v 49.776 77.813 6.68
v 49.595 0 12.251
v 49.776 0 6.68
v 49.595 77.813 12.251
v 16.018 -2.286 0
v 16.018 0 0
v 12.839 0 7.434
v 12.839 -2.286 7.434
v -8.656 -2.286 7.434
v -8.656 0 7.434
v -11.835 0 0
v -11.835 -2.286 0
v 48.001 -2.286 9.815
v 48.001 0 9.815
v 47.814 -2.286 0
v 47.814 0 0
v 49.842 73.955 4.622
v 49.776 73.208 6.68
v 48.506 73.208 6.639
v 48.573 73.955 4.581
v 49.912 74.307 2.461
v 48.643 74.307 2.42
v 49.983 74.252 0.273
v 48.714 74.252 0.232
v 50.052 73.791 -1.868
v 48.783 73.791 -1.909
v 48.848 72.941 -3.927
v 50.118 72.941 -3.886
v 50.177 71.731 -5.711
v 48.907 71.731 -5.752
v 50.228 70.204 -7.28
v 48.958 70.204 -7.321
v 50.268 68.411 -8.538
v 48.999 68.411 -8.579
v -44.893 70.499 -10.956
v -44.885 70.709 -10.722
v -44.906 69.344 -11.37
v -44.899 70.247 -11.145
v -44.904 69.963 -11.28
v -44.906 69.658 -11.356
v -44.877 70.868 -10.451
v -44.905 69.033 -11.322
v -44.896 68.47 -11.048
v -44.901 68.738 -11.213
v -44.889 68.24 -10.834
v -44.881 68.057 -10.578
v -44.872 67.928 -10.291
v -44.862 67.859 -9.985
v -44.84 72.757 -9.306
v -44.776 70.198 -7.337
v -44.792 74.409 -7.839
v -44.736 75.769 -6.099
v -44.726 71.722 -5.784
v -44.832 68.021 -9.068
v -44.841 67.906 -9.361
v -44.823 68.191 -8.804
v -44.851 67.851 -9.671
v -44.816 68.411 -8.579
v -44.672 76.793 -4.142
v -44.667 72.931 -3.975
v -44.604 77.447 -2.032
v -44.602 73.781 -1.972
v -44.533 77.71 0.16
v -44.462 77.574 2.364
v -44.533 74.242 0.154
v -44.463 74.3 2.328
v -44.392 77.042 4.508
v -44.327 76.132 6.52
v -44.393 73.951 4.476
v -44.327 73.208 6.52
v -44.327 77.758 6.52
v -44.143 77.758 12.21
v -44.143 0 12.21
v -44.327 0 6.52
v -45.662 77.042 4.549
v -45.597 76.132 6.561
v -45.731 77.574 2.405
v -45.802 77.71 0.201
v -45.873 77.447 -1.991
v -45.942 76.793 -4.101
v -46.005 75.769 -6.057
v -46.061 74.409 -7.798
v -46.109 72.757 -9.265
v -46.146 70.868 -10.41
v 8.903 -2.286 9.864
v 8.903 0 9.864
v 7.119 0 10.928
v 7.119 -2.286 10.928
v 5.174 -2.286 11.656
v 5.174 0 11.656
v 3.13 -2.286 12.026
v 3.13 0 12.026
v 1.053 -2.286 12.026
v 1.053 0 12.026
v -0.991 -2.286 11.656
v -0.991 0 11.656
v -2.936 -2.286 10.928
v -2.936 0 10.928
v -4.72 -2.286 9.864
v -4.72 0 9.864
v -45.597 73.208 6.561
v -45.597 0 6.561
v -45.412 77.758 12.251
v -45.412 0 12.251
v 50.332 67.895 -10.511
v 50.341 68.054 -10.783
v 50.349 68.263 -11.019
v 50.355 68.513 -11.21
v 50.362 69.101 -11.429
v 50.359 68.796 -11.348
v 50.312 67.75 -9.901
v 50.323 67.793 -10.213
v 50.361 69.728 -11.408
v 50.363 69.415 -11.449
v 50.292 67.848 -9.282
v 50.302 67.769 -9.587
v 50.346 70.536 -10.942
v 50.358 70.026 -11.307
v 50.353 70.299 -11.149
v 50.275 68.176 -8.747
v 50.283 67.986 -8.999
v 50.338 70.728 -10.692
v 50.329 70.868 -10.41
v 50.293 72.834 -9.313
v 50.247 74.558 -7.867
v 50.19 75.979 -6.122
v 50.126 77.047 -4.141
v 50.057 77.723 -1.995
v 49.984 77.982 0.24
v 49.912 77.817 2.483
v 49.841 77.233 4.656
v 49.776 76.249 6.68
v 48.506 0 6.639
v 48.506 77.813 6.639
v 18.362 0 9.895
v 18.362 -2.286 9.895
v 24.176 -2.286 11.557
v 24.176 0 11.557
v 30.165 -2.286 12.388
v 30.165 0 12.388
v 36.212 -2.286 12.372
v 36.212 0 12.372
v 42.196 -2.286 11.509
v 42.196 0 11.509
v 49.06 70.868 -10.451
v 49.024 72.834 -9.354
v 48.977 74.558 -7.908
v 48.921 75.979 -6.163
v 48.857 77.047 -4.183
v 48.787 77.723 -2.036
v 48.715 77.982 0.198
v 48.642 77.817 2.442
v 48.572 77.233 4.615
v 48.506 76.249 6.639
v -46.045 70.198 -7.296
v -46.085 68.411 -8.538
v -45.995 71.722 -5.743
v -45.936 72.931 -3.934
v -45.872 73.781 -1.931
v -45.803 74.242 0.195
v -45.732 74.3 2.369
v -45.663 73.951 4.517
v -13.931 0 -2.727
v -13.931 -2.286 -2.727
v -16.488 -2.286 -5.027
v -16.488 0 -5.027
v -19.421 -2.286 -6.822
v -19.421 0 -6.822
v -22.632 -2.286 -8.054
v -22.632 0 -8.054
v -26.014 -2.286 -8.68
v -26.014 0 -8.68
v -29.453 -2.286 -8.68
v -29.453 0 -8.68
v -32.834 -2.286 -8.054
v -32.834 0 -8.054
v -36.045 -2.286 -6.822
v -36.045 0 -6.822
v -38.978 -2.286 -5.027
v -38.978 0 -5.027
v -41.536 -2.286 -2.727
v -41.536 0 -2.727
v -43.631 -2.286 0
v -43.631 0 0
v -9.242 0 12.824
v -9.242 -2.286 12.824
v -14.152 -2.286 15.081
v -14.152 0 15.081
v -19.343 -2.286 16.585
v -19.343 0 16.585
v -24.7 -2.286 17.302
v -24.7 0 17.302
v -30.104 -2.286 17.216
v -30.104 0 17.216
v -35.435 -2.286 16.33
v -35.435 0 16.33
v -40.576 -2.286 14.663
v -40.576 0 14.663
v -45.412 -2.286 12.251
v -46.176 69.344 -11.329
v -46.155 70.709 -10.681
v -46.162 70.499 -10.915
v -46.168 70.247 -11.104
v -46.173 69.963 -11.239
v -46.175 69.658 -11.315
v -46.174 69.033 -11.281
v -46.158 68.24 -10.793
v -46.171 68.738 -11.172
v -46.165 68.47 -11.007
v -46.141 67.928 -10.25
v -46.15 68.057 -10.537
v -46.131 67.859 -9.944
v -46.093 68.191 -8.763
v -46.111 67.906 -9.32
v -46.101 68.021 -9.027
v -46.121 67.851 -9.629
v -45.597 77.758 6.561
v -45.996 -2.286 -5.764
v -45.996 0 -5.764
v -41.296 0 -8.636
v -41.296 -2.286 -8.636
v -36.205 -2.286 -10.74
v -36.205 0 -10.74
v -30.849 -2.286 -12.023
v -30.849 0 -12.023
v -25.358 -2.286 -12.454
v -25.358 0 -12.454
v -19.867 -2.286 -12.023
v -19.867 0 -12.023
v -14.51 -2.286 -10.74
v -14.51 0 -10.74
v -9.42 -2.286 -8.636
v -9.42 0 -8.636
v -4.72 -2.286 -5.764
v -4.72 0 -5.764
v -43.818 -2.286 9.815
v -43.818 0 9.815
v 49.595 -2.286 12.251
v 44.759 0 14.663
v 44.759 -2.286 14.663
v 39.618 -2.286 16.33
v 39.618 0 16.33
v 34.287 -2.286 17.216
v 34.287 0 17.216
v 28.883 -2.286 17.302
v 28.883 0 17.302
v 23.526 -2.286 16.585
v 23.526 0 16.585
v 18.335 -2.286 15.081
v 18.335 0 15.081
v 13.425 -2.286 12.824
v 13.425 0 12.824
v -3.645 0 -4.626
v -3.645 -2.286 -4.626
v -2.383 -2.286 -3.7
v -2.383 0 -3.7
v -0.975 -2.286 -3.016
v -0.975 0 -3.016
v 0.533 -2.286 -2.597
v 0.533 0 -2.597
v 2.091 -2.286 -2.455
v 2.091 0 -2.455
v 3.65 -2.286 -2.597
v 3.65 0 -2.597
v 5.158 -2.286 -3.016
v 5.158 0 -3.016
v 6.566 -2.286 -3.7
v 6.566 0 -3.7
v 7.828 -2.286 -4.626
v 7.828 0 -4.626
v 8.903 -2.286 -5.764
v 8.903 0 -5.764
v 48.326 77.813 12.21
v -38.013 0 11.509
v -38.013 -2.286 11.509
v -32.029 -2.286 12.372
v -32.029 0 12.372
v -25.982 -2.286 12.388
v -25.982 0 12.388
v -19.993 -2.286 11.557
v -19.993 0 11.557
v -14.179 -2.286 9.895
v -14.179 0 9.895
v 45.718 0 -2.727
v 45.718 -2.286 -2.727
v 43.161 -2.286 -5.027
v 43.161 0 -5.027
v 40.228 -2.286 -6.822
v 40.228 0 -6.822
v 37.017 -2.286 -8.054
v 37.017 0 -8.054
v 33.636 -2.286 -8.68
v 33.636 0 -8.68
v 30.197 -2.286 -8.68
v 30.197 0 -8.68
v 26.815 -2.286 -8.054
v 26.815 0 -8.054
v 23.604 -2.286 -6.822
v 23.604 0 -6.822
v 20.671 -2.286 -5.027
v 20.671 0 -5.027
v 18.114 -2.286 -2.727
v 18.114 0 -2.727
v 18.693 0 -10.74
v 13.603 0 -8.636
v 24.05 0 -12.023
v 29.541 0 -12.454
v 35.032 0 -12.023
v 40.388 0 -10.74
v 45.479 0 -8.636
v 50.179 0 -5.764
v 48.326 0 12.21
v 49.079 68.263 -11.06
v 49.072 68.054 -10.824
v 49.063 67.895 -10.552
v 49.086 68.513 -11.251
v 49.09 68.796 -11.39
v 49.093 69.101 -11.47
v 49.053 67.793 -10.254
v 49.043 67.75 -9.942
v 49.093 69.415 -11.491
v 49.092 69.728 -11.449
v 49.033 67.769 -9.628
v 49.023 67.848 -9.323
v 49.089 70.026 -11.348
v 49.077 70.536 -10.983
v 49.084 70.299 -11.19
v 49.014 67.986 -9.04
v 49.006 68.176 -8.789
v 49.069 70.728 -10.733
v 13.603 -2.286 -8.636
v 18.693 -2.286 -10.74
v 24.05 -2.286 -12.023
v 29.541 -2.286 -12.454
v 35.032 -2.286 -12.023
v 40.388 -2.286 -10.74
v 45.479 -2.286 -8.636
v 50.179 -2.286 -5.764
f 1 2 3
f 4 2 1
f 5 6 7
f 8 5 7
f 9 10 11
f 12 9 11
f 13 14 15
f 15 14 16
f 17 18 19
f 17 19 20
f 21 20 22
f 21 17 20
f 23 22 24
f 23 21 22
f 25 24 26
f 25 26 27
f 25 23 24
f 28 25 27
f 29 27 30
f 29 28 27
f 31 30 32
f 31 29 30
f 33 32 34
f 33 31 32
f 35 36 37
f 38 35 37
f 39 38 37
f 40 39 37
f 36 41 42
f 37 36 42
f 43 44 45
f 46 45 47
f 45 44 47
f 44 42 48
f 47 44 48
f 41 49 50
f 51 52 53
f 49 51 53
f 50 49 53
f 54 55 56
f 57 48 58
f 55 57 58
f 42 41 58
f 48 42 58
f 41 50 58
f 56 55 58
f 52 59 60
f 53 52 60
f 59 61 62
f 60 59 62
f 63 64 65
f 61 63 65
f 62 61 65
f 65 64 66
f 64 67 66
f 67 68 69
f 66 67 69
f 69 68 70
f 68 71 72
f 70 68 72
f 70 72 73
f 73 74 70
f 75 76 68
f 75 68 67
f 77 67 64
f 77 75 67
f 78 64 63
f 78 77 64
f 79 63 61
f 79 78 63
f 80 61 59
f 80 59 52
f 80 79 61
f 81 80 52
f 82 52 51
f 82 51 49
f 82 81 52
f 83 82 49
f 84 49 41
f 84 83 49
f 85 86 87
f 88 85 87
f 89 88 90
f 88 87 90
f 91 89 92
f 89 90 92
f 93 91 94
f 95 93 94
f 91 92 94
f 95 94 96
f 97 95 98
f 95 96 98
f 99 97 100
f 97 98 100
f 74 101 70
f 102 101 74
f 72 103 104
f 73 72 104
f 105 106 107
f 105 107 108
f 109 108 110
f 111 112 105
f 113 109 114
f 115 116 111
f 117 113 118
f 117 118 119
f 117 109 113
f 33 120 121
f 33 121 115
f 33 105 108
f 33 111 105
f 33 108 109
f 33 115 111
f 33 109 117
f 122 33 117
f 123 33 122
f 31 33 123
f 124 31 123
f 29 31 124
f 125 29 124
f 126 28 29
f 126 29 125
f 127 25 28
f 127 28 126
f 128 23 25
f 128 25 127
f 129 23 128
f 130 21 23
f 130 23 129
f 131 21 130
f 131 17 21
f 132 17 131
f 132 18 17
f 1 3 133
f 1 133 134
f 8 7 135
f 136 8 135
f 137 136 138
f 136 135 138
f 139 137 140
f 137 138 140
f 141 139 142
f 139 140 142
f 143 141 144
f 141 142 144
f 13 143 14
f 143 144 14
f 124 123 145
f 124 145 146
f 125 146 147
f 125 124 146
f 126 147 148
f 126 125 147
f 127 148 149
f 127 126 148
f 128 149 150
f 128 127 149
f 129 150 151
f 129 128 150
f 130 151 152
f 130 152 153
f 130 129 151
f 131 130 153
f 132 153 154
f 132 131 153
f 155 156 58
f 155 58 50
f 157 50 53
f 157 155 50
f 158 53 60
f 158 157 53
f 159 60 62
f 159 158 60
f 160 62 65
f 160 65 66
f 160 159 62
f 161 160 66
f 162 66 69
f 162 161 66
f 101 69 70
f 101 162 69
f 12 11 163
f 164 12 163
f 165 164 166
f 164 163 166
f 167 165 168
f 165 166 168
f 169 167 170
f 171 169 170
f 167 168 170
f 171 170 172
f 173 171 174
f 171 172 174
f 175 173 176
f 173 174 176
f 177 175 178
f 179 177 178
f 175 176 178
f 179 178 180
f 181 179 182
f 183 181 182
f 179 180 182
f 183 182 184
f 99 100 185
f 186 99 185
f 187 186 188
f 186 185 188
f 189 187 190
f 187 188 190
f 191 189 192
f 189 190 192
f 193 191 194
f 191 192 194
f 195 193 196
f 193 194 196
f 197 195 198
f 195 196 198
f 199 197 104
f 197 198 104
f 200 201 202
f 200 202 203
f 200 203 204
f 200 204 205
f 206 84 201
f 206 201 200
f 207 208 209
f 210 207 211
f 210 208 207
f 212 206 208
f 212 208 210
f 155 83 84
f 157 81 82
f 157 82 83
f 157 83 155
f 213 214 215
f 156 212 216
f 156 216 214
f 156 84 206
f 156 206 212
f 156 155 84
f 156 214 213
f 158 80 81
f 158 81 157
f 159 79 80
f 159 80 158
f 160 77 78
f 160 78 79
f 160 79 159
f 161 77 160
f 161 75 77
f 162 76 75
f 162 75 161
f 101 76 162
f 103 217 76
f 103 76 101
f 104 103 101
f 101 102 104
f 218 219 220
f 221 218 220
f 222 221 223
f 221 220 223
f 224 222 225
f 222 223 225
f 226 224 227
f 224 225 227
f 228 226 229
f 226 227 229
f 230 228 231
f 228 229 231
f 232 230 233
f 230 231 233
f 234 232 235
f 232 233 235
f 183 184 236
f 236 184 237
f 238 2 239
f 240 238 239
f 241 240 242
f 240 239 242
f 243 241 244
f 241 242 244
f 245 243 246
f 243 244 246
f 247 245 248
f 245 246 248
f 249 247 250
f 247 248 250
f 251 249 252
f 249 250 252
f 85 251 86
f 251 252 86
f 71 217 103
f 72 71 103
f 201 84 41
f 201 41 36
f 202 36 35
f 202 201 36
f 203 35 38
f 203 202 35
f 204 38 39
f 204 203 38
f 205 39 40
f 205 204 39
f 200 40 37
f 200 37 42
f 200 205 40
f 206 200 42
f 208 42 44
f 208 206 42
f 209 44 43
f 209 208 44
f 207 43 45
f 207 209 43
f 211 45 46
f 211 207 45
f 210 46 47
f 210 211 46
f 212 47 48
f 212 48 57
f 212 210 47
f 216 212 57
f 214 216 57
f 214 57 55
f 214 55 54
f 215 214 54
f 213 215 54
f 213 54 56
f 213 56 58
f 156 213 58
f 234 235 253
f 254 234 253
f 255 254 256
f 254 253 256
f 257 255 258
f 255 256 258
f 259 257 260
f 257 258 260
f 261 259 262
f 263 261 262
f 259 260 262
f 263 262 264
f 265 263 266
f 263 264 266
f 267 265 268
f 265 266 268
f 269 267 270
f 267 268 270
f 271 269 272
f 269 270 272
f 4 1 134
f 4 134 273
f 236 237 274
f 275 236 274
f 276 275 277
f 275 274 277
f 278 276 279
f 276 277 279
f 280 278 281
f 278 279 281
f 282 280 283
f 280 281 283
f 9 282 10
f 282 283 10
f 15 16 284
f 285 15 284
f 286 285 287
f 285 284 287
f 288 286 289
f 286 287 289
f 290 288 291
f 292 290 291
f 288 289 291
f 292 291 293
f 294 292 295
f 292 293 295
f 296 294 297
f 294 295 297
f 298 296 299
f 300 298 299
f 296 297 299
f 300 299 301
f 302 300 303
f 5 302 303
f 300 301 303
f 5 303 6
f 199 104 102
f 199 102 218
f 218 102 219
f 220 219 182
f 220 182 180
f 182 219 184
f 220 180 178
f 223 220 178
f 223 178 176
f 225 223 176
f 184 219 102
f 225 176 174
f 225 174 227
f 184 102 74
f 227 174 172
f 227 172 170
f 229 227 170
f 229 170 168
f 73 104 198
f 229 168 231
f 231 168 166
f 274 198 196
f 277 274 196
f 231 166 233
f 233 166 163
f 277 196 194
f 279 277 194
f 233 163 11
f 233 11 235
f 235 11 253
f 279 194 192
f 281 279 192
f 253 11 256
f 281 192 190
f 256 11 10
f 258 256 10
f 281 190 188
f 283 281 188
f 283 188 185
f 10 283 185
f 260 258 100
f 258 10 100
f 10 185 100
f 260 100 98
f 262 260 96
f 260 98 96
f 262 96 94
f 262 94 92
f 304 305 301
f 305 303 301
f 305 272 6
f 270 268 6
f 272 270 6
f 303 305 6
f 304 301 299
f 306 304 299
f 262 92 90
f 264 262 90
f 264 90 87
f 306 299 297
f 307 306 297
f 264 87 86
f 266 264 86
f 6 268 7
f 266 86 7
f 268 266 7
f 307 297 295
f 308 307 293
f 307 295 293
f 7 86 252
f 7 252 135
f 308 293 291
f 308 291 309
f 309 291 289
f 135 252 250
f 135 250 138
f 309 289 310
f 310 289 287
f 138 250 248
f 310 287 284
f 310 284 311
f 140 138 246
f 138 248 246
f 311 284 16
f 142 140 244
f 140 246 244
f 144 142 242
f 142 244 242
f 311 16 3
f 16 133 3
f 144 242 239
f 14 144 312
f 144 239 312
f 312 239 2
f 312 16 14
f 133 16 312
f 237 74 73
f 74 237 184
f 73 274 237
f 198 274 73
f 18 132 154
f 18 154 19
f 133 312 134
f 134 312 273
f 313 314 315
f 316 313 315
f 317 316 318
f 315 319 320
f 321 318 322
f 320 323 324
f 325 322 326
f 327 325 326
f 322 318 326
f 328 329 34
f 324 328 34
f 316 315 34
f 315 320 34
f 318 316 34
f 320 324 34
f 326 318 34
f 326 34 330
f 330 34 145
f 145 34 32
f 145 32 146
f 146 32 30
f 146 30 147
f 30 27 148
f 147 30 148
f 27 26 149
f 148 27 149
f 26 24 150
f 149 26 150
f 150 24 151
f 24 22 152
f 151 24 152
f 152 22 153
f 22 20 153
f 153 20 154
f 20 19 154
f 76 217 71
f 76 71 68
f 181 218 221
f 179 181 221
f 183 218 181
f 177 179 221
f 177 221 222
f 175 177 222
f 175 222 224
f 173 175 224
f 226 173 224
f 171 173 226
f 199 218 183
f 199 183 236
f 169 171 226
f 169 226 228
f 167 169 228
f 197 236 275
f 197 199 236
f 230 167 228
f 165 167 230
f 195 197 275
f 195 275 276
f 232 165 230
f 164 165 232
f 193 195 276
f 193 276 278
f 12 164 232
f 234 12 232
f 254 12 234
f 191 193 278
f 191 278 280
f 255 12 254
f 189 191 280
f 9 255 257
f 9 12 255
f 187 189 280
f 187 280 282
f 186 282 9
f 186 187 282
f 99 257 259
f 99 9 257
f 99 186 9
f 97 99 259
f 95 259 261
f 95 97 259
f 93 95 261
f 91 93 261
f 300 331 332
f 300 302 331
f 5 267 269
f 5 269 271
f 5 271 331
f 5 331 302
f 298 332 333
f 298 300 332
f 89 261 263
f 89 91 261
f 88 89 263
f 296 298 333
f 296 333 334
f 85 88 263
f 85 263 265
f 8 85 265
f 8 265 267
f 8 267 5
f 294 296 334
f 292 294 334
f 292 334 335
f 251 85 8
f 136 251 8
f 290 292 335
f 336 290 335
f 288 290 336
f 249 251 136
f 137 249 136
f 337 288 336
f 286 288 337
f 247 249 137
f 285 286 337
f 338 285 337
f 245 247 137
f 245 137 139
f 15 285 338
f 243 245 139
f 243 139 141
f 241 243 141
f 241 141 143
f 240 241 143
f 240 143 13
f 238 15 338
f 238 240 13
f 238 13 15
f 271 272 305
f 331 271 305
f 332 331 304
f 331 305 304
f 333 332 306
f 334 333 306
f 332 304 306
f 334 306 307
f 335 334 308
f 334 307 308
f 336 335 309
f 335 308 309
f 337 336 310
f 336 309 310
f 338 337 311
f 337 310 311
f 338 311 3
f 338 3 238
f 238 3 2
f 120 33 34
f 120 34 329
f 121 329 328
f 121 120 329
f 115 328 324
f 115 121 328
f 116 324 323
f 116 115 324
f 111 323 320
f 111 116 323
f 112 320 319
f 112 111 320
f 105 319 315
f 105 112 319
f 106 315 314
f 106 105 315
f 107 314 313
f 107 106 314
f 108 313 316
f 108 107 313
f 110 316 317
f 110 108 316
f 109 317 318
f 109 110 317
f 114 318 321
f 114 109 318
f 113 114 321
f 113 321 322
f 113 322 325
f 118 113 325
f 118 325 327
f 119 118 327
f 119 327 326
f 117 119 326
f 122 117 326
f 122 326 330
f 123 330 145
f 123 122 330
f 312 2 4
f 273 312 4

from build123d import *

# Parameters (mm, degrees)
F1_DEPTH  = 2.286
F2_W      = 77.7575820684
F2_H      = 5.6929403374
F3_DEPTH  = 1.27
F4_W      = 77.8131708503
F4_H      = 5.5740863885
F5_DEPTH  = 1.27
F11_DEPTH = 1.27
F12_DEPTH = 1.27


# Not quite as in the source:
# - the program builds the solid bodies; features that only make, move or delete a surface that nothing else refers to are left out


with BuildPart() as f1:
    # F0 (on Front) → F1 (new body)
    with BuildSketch(Plane.XZ):
        with BuildLine():
            ThreePointArc((49.5953476056, 12.2513668612), (28.882888205, 17.3015230489), (8.9030108118, 9.8641477525))
            ThreePointArc((8.9030108118, 9.8641477525), (2.0914725028, 12.0726852219), (-4.7200658062, 9.8641477525))
            ThreePointArc((-4.7200658062, 9.8641477525), (-24.6999431994, 17.3015230489), (-45.4124026, 12.2513668612))
            Line((-45.4124026, 12.2513668612), (-45.9956228733, -5.7643466812))
            ThreePointArc((-45.9956228733, -5.7643466812), (-25.3578443398, -12.4538689532), (-4.7200658062, -5.7643466812))
            ThreePointArc((-4.7200658062, -5.7643466812), (2.0914725028, -2.4552290608), (8.9030108118, -5.7643466812))
            ThreePointArc((8.9030108118, -5.7643466812), (29.5407893454, -12.4538689532), (50.1785678789, -5.7643466812))
            Line((50.1785678789, -5.7643466812), (49.5953476056, 12.2513668612))
        make_face()
        with BuildLine():
            ThreePointArc((-43.8181608915, 9.8152747378), (-25.9821003979, 12.388296488), (-8.655664511, 7.4344985187))
            Line((-8.655664511, 7.4344985187), (-11.8352537975, 0))
            ThreePointArc((-11.8352537975, 0), (-27.7331932448, -8.7587656644), (-43.6311326921, 0))
            Line((-43.6311326921, 0), (-43.8181608915, 9.8152747378))
        make_face(mode=Mode.SUBTRACT)
        with BuildLine():
            Line((48.0011058971, 9.8152747378), (47.8140776977, 0))
            ThreePointArc((47.8140776977, 0), (31.9161382504, -8.7587656644), (16.0181988031, 0))
            Line((16.0181988031, 0), (12.8386095166, 7.4344985187))
            ThreePointArc((12.8386095166, 7.4344985187), (30.1650454035, 12.388296488), (48.0011058971, 9.8152747378))
        make_face(mode=Mode.SUBTRACT)
    extrude(amount=F1_DEPTH)

    # F2 (on face) → F3 (join)
    with BuildSketch(Plane(origin=(-45.7610567543, 0, 1.4814165402), x_dir=(0, -1, 0), z_dir=(-0.9994764103, 0, 0.0323559155))):
        with Locations((-38.8787910342, 7.9291221415)):
            Rectangle(F2_W, F2_H)
    extrude(amount=-F3_DEPTH)

    # F4 (on face) → F5 (join)
    with BuildSketch(Plane(origin=(49.9396226128, 0, 1.6166886911), x_dir=(0, 1, 0), z_dir=(0.9994764103, 0, 0.0323559155))):
        with Locations((38.9065854251, 7.8532061008)):
            Rectangle(F4_W, F4_H)
    extrude(amount=-F5_DEPTH)

    # F10 (on face) → F11 (join)
    with BuildSketch(Plane(origin=(-45.7610567543, 0, 1.4814165402), x_dir=(0, -1, 0), z_dir=(-0.9994764103, 0, 0.0323559155))):
        with BuildLine():
            ThreePointArc((-68.4109553695, -10.0245960057), (-73.7805543262, -3.4143727695), (-73.2076540589, 5.0826519728))
            Line((-73.2076540589, 5.0826519728), (-76.1324688792, 5.0826519728))
            ThreePointArc((-76.1324688792, 5.0826519728), (-77.1679356937, -4.5445995463), (-70.867806673, -11.8974586949))
            ThreePointArc((-70.867806673, -11.8974586949), (-68.4698563349, -12.4952285851), (-68.4109553695, -10.0245960057))
        make_face()
    extrude(amount=-F11_DEPTH)


with BuildPart() as f12:
    # F9 (on face) → F12 (new body)
    with BuildSketch(Plane(origin=(49.9396226128, 0, 1.6166886911), x_dir=(0, 1, 0), z_dir=(0.9994764103, 0, 0.0323559155))):
        with BuildLine():
            ThreePointArc((68.4109553695, -10.1599385962), (68.3834154508, -12.7439657132), (70.867806673, -12.0328012854))
            ThreePointArc((70.867806673, -12.0328012854), (77.4354700769, -4.7034982276), (76.2494653463, 5.0661629066))
            Line((76.2494653463, 5.0661629066), (73.2076540589, 5.0661629066))
            ThreePointArc((73.2076540589, 5.0661629066), (73.7912313756, -3.4862881047), (68.4109553695, -10.1599385962))
        make_face()
    extrude(amount=-F12_DEPTH)


solid = Compound([f1.part, f12.part])
